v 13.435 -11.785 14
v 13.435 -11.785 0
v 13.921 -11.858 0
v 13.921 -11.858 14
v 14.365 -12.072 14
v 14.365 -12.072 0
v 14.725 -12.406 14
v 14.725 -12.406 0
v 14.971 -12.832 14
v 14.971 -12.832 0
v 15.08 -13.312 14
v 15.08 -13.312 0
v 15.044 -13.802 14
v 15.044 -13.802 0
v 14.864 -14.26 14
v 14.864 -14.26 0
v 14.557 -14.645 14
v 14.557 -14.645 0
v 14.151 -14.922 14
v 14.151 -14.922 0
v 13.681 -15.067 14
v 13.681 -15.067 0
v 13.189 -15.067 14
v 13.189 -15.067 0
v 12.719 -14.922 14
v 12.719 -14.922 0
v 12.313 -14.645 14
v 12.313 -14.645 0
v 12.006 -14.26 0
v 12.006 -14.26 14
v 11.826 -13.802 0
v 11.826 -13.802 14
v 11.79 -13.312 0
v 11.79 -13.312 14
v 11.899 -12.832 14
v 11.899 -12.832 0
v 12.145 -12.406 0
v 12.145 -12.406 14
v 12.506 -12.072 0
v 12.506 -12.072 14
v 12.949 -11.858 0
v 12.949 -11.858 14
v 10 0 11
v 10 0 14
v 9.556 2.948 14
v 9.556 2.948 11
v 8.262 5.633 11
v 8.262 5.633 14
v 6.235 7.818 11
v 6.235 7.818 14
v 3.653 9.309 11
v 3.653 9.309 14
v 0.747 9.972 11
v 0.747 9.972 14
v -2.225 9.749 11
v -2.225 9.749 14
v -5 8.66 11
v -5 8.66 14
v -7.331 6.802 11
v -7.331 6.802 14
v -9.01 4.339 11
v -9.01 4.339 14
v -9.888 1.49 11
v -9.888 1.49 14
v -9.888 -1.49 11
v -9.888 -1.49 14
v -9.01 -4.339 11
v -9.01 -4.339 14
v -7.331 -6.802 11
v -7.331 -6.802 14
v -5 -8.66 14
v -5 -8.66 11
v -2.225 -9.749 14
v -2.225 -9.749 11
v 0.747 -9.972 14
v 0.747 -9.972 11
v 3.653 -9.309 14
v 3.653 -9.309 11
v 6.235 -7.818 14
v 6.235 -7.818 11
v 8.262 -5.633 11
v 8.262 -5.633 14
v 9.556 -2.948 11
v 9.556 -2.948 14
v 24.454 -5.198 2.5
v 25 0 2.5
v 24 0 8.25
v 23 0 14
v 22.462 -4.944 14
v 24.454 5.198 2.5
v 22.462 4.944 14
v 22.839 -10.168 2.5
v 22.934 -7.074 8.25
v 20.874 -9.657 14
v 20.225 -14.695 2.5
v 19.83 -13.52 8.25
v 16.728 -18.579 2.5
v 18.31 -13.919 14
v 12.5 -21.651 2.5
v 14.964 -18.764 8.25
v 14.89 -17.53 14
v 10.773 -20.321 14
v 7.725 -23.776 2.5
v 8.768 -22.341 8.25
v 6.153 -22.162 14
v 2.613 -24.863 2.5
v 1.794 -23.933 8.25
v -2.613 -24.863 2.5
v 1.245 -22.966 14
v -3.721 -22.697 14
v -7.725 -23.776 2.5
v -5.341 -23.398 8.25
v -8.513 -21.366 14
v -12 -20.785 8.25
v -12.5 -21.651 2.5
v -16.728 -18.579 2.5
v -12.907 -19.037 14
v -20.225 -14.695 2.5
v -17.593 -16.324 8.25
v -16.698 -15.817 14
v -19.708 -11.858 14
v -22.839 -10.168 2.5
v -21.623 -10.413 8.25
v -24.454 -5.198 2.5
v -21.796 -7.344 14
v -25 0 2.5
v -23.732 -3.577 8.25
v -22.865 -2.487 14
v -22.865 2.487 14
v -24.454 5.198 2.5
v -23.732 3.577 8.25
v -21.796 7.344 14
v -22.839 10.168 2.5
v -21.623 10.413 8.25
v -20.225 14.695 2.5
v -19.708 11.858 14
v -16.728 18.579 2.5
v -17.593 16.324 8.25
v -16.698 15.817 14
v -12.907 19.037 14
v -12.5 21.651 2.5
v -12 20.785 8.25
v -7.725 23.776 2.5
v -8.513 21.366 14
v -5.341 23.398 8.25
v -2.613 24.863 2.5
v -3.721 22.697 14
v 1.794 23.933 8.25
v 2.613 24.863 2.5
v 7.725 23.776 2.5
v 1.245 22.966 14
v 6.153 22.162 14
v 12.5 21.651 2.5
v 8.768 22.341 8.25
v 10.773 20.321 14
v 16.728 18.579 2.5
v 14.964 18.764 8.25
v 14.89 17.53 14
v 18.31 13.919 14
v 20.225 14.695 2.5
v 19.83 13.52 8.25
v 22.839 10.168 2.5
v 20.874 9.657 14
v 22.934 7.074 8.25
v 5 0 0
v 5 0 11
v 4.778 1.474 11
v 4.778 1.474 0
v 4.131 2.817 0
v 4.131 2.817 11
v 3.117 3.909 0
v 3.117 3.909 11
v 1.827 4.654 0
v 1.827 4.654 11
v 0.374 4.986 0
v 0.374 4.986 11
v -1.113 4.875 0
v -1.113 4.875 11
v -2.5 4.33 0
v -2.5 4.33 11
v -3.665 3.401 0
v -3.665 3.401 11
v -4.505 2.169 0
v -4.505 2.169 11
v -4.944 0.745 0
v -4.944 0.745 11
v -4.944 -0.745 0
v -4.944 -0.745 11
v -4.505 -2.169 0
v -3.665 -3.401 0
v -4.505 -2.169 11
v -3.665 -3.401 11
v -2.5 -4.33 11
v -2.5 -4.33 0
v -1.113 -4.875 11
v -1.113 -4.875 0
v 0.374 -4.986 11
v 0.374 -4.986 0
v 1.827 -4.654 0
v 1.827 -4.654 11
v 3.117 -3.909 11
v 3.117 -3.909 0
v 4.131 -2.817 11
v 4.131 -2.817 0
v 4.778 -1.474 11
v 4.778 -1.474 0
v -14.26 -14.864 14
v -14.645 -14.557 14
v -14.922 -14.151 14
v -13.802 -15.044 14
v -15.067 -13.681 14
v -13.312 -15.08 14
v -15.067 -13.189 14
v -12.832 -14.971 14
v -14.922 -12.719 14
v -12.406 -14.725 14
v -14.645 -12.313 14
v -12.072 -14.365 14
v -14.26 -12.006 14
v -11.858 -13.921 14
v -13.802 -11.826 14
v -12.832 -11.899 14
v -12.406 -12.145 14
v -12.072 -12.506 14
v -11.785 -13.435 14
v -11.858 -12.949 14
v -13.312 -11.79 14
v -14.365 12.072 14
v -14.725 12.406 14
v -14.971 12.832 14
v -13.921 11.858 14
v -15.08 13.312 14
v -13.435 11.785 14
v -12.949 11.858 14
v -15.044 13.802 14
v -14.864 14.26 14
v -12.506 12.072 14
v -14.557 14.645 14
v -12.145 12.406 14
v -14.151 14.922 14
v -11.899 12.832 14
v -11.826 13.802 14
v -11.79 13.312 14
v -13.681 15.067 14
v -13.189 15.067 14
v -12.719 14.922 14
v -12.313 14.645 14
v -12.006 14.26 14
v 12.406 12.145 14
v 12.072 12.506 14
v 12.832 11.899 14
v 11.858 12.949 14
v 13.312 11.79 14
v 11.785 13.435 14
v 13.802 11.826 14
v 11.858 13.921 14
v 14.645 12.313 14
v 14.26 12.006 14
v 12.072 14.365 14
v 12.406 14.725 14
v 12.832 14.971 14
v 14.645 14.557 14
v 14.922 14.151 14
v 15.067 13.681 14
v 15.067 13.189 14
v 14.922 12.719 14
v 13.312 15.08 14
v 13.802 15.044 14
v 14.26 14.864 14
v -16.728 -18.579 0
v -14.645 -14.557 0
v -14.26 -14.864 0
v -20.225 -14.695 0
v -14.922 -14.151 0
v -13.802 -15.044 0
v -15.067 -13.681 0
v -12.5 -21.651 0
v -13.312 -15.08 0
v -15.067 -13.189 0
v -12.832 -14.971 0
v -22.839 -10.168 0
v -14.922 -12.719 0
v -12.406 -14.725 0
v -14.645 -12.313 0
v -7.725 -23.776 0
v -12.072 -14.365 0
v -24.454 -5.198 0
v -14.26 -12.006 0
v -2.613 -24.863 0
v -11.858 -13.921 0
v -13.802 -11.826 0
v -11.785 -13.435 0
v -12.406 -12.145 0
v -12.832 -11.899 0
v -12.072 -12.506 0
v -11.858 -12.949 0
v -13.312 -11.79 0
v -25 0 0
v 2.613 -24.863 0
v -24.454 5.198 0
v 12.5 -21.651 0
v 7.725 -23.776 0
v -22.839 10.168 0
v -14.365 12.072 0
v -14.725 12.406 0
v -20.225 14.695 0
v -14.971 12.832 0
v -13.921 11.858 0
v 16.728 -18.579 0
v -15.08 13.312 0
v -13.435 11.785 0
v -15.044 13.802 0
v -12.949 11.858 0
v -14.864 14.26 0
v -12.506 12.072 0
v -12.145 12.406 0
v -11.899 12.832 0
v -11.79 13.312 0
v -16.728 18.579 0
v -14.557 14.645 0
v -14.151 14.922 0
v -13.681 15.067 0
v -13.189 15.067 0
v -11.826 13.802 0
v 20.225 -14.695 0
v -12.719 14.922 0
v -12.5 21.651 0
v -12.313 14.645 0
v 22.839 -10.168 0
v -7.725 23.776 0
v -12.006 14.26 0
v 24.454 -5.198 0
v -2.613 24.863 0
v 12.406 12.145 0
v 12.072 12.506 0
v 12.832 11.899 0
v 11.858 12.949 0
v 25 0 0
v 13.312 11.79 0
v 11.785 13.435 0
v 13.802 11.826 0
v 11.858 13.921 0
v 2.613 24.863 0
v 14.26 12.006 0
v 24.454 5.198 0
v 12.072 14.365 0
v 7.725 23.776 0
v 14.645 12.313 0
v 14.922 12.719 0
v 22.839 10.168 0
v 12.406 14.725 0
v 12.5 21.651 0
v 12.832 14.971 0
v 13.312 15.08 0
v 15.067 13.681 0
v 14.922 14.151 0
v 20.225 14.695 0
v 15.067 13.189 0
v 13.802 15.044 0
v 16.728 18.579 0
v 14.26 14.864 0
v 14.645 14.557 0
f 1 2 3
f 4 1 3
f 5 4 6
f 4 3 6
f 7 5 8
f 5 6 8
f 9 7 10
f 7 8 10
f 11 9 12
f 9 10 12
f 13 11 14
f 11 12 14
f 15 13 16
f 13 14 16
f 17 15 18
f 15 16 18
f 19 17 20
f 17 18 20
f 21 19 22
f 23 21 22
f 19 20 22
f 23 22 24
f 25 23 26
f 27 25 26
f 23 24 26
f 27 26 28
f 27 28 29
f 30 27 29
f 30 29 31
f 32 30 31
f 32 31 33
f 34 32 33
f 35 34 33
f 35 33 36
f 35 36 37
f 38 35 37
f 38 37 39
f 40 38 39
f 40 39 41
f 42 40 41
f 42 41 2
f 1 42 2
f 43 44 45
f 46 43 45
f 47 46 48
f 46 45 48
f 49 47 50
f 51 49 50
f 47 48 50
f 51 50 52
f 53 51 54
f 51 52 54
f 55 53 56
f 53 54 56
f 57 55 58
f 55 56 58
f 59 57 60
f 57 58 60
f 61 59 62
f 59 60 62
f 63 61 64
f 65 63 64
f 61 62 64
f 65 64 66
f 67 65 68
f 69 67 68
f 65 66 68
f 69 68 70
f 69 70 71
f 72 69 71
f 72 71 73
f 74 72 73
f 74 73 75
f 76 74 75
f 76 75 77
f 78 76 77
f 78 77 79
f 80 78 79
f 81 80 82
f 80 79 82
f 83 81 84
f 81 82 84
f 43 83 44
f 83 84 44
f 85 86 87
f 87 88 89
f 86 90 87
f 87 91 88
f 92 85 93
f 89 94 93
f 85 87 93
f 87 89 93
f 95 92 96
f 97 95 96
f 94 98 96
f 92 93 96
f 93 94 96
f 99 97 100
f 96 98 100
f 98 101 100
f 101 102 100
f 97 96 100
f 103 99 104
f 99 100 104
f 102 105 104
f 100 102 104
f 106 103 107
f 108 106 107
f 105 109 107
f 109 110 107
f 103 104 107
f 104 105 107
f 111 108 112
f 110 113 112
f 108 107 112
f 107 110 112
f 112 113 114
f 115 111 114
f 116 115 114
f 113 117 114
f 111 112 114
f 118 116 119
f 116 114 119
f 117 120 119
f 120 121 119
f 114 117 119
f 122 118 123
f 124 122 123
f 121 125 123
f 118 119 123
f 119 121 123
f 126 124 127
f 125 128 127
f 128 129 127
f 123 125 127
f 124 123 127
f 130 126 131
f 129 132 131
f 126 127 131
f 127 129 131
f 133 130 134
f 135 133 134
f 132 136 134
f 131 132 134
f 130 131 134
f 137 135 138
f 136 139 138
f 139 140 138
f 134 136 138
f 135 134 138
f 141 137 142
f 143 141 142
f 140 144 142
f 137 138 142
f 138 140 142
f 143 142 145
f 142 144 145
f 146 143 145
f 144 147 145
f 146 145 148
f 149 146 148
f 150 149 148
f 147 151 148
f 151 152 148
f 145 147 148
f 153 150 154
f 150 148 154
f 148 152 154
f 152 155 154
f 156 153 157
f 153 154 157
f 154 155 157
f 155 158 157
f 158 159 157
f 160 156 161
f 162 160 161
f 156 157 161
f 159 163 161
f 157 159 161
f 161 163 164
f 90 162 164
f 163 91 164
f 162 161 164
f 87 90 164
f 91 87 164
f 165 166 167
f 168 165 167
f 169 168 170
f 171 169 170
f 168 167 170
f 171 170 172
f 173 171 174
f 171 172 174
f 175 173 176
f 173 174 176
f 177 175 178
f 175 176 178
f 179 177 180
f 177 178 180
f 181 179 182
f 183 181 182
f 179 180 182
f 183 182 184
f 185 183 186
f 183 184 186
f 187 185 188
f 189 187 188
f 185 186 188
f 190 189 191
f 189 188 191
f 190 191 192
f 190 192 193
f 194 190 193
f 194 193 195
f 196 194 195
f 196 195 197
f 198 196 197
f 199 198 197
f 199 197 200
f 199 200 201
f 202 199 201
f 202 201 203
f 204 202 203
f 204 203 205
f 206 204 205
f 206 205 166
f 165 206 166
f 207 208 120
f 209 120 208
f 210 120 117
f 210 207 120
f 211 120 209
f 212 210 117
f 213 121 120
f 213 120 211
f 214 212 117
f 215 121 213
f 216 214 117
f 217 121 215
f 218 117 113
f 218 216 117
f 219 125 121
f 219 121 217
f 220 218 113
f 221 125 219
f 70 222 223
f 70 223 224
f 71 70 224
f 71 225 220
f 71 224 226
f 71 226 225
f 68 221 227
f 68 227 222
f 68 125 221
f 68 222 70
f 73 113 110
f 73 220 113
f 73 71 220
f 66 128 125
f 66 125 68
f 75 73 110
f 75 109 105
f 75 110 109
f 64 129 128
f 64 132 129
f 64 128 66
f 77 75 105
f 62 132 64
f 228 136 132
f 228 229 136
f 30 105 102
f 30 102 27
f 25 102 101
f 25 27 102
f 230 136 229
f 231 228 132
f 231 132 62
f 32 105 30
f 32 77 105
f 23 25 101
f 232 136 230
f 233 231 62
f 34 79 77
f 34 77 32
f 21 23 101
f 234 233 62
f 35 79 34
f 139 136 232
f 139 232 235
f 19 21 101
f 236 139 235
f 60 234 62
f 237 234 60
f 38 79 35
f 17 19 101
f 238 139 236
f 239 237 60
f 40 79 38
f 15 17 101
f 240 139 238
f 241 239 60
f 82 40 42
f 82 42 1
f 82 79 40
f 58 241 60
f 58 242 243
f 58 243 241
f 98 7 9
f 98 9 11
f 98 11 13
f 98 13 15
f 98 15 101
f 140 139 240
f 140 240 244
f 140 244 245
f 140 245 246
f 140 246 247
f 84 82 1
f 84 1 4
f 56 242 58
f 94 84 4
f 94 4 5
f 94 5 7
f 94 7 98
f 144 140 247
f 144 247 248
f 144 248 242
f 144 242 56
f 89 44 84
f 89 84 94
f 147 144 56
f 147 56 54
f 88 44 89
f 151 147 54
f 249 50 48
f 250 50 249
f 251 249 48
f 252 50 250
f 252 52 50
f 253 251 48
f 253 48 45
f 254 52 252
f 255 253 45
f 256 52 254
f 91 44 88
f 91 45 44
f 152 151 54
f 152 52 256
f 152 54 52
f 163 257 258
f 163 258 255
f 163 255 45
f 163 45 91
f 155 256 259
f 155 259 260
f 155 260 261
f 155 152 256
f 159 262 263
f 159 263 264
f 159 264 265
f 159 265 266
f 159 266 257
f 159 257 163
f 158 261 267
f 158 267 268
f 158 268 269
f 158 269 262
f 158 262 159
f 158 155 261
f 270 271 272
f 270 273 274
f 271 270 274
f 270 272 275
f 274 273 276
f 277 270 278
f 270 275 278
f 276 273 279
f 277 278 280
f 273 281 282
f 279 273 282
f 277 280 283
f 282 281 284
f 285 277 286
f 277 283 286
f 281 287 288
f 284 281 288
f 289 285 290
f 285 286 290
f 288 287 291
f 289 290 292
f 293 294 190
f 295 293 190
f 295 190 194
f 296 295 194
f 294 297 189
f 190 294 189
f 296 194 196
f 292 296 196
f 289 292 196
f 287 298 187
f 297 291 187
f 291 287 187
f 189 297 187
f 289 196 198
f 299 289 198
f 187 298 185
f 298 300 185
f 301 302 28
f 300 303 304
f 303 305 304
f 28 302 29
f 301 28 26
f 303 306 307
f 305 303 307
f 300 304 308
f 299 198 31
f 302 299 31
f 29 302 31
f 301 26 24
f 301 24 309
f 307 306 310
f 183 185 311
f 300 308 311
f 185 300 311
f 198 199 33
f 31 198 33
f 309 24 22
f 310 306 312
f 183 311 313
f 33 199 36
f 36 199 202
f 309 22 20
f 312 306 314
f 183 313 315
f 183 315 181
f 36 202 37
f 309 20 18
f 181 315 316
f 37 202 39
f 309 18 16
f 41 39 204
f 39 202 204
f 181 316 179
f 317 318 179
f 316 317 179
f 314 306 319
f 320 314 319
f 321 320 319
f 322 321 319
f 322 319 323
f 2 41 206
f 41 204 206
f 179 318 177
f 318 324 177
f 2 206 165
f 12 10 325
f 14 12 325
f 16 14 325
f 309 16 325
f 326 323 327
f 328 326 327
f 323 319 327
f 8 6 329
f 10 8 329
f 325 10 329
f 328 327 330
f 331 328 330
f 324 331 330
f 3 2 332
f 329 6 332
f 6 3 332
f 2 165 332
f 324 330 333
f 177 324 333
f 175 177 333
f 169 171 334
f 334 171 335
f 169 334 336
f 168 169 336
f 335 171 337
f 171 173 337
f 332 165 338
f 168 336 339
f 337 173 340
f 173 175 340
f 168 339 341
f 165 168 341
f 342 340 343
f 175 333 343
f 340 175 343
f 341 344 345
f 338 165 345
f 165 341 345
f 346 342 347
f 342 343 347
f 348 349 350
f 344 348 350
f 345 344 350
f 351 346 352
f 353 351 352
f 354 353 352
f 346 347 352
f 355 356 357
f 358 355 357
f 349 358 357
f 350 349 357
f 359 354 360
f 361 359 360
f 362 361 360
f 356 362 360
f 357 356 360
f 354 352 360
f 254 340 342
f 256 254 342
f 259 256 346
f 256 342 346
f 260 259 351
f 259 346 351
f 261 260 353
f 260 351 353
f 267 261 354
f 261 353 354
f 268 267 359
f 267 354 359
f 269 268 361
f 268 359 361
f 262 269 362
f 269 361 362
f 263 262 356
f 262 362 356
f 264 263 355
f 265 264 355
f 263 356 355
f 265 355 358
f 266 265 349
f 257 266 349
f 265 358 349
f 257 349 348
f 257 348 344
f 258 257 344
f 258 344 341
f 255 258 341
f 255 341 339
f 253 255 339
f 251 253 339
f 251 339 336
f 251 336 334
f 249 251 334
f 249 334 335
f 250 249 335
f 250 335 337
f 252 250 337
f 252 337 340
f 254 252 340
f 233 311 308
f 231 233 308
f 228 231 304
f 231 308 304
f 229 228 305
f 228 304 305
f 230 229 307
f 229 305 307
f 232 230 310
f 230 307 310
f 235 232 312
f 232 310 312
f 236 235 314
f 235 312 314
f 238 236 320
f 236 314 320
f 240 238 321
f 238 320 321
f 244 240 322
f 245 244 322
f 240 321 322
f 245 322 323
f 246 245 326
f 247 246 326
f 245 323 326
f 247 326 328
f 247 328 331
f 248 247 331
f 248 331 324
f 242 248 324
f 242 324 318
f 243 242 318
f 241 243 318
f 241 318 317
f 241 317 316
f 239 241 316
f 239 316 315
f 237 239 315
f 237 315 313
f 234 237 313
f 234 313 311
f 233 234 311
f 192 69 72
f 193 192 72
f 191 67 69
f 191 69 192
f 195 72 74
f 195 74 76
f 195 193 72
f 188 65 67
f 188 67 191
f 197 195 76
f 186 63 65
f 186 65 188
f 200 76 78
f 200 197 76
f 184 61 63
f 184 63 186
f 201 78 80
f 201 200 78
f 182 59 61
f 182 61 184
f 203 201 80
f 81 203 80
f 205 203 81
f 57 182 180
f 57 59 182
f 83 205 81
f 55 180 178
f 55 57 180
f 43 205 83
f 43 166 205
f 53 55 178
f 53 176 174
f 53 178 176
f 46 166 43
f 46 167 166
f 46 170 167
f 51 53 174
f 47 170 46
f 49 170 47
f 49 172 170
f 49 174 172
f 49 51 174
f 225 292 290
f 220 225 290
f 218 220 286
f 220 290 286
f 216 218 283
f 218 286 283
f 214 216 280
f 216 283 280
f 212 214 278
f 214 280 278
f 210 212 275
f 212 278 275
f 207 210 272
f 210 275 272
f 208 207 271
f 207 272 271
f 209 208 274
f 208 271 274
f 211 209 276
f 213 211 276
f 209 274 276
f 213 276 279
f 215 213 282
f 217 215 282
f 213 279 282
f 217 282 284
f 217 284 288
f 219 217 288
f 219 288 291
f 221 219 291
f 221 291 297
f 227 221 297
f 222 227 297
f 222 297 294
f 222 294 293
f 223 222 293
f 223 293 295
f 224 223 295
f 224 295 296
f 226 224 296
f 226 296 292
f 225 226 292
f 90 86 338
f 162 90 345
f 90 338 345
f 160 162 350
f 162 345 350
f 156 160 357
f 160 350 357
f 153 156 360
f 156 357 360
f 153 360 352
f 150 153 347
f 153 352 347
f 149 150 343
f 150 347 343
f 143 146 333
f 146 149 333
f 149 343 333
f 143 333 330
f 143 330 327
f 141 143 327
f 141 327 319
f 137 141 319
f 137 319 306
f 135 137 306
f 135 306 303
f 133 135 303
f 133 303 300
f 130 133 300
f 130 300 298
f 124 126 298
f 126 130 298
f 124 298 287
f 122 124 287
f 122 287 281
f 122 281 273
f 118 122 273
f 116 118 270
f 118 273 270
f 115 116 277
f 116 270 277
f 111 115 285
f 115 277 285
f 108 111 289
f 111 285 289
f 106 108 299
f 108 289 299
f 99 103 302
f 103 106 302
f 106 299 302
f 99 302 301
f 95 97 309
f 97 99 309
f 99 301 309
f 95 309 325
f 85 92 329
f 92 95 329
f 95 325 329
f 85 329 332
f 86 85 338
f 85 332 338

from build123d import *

# Parameters (mm, degrees)
SKETCH_1_R               = 25
EXTRUDE_1_DEPTH          = 14
SKETCH_3_R               = 1.5
CUT_EXTRUDE_1_DEPTH      = 2
HOLE_WIZARD_M4_1_D       = 3.3
PATTERN_CIRCULAR_1_COUNT = 4
SKETCH_5_R               = 10
CUT_EXTRUDE_2_DEPTH      = 3
SKETCH_6_R               = 5
CUT_EXTRUDE_3_DEPTH      = 38.027017163


with BuildPart() as part:
    # 草图1 → 凸台-拉伸1 (new body)
    with BuildSketch(Plane.XY):
        Circle(SKETCH_1_R)
    extrude(amount=EXTRUDE_1_DEPTH)

    # 草图2 → 切除-旋转1 (revolve, cut)
    with BuildSketch(Plane(origin=(0, 0, 0), x_dir=(0, 0, -1), z_dir=(1, 0, 0)), mode=Mode.PRIVATE) as cut_revolve_1_sk:
        Polygon((-14, 25), (-2.5, 25), (-14, 23), align=None)
    revolve(cut_revolve_1_sk.sketch.rotate(Axis((0, 0, 0), (0, 0, -1)), 90), axis=Axis((0, 0, 0), (0, 0, -1)), mode=Mode.SUBTRACT)

    # 草图3 → 切除-拉伸1 (cut)
    with BuildSketch(Plane.XY.offset(14)):
        with Locations((13.435028843, 13.435028843)):
            Circle(SKETCH_3_R)
    extrude(amount=-CUT_EXTRUDE_1_DEPTH, mode=Mode.SUBTRACT)

    # M4 螺纹孔1 (through all)
    with Locations(Plane(origin=(13.435028843, 13.435028843, 14), x_dir=(1, 0, 0), z_dir=(0, 0, 1))):
        with Locations((0, 0)):
            hole_wizard_m4_1 = Hole(HOLE_WIZARD_M4_1_D / 2)

    # 阵列(圆周)1: M4 螺纹孔1 ×4 about axis
    pattern_circular_1_axis = Axis((0, 0, 0), (0, 0, 1))
    for i in range(1, PATTERN_CIRCULAR_1_COUNT):
        add(hole_wizard_m4_1.rotate(pattern_circular_1_axis, i * 360 / PATTERN_CIRCULAR_1_COUNT), mode=Mode.SUBTRACT)

    # 草图5 → 切除-拉伸2 (cut)
    with BuildSketch(Plane.XY.offset(14)):
        Circle(SKETCH_5_R)
    extrude(amount=-CUT_EXTRUDE_2_DEPTH, mode=Mode.SUBTRACT)

    # 草图6 → 切除-拉伸3 (cut, through all)
    with BuildSketch(Plane.XY.offset(11)):
        Circle(SKETCH_6_R)
    extrude(amount=-CUT_EXTRUDE_3_DEPTH, mode=Mode.SUBTRACT)


solid = part.part
